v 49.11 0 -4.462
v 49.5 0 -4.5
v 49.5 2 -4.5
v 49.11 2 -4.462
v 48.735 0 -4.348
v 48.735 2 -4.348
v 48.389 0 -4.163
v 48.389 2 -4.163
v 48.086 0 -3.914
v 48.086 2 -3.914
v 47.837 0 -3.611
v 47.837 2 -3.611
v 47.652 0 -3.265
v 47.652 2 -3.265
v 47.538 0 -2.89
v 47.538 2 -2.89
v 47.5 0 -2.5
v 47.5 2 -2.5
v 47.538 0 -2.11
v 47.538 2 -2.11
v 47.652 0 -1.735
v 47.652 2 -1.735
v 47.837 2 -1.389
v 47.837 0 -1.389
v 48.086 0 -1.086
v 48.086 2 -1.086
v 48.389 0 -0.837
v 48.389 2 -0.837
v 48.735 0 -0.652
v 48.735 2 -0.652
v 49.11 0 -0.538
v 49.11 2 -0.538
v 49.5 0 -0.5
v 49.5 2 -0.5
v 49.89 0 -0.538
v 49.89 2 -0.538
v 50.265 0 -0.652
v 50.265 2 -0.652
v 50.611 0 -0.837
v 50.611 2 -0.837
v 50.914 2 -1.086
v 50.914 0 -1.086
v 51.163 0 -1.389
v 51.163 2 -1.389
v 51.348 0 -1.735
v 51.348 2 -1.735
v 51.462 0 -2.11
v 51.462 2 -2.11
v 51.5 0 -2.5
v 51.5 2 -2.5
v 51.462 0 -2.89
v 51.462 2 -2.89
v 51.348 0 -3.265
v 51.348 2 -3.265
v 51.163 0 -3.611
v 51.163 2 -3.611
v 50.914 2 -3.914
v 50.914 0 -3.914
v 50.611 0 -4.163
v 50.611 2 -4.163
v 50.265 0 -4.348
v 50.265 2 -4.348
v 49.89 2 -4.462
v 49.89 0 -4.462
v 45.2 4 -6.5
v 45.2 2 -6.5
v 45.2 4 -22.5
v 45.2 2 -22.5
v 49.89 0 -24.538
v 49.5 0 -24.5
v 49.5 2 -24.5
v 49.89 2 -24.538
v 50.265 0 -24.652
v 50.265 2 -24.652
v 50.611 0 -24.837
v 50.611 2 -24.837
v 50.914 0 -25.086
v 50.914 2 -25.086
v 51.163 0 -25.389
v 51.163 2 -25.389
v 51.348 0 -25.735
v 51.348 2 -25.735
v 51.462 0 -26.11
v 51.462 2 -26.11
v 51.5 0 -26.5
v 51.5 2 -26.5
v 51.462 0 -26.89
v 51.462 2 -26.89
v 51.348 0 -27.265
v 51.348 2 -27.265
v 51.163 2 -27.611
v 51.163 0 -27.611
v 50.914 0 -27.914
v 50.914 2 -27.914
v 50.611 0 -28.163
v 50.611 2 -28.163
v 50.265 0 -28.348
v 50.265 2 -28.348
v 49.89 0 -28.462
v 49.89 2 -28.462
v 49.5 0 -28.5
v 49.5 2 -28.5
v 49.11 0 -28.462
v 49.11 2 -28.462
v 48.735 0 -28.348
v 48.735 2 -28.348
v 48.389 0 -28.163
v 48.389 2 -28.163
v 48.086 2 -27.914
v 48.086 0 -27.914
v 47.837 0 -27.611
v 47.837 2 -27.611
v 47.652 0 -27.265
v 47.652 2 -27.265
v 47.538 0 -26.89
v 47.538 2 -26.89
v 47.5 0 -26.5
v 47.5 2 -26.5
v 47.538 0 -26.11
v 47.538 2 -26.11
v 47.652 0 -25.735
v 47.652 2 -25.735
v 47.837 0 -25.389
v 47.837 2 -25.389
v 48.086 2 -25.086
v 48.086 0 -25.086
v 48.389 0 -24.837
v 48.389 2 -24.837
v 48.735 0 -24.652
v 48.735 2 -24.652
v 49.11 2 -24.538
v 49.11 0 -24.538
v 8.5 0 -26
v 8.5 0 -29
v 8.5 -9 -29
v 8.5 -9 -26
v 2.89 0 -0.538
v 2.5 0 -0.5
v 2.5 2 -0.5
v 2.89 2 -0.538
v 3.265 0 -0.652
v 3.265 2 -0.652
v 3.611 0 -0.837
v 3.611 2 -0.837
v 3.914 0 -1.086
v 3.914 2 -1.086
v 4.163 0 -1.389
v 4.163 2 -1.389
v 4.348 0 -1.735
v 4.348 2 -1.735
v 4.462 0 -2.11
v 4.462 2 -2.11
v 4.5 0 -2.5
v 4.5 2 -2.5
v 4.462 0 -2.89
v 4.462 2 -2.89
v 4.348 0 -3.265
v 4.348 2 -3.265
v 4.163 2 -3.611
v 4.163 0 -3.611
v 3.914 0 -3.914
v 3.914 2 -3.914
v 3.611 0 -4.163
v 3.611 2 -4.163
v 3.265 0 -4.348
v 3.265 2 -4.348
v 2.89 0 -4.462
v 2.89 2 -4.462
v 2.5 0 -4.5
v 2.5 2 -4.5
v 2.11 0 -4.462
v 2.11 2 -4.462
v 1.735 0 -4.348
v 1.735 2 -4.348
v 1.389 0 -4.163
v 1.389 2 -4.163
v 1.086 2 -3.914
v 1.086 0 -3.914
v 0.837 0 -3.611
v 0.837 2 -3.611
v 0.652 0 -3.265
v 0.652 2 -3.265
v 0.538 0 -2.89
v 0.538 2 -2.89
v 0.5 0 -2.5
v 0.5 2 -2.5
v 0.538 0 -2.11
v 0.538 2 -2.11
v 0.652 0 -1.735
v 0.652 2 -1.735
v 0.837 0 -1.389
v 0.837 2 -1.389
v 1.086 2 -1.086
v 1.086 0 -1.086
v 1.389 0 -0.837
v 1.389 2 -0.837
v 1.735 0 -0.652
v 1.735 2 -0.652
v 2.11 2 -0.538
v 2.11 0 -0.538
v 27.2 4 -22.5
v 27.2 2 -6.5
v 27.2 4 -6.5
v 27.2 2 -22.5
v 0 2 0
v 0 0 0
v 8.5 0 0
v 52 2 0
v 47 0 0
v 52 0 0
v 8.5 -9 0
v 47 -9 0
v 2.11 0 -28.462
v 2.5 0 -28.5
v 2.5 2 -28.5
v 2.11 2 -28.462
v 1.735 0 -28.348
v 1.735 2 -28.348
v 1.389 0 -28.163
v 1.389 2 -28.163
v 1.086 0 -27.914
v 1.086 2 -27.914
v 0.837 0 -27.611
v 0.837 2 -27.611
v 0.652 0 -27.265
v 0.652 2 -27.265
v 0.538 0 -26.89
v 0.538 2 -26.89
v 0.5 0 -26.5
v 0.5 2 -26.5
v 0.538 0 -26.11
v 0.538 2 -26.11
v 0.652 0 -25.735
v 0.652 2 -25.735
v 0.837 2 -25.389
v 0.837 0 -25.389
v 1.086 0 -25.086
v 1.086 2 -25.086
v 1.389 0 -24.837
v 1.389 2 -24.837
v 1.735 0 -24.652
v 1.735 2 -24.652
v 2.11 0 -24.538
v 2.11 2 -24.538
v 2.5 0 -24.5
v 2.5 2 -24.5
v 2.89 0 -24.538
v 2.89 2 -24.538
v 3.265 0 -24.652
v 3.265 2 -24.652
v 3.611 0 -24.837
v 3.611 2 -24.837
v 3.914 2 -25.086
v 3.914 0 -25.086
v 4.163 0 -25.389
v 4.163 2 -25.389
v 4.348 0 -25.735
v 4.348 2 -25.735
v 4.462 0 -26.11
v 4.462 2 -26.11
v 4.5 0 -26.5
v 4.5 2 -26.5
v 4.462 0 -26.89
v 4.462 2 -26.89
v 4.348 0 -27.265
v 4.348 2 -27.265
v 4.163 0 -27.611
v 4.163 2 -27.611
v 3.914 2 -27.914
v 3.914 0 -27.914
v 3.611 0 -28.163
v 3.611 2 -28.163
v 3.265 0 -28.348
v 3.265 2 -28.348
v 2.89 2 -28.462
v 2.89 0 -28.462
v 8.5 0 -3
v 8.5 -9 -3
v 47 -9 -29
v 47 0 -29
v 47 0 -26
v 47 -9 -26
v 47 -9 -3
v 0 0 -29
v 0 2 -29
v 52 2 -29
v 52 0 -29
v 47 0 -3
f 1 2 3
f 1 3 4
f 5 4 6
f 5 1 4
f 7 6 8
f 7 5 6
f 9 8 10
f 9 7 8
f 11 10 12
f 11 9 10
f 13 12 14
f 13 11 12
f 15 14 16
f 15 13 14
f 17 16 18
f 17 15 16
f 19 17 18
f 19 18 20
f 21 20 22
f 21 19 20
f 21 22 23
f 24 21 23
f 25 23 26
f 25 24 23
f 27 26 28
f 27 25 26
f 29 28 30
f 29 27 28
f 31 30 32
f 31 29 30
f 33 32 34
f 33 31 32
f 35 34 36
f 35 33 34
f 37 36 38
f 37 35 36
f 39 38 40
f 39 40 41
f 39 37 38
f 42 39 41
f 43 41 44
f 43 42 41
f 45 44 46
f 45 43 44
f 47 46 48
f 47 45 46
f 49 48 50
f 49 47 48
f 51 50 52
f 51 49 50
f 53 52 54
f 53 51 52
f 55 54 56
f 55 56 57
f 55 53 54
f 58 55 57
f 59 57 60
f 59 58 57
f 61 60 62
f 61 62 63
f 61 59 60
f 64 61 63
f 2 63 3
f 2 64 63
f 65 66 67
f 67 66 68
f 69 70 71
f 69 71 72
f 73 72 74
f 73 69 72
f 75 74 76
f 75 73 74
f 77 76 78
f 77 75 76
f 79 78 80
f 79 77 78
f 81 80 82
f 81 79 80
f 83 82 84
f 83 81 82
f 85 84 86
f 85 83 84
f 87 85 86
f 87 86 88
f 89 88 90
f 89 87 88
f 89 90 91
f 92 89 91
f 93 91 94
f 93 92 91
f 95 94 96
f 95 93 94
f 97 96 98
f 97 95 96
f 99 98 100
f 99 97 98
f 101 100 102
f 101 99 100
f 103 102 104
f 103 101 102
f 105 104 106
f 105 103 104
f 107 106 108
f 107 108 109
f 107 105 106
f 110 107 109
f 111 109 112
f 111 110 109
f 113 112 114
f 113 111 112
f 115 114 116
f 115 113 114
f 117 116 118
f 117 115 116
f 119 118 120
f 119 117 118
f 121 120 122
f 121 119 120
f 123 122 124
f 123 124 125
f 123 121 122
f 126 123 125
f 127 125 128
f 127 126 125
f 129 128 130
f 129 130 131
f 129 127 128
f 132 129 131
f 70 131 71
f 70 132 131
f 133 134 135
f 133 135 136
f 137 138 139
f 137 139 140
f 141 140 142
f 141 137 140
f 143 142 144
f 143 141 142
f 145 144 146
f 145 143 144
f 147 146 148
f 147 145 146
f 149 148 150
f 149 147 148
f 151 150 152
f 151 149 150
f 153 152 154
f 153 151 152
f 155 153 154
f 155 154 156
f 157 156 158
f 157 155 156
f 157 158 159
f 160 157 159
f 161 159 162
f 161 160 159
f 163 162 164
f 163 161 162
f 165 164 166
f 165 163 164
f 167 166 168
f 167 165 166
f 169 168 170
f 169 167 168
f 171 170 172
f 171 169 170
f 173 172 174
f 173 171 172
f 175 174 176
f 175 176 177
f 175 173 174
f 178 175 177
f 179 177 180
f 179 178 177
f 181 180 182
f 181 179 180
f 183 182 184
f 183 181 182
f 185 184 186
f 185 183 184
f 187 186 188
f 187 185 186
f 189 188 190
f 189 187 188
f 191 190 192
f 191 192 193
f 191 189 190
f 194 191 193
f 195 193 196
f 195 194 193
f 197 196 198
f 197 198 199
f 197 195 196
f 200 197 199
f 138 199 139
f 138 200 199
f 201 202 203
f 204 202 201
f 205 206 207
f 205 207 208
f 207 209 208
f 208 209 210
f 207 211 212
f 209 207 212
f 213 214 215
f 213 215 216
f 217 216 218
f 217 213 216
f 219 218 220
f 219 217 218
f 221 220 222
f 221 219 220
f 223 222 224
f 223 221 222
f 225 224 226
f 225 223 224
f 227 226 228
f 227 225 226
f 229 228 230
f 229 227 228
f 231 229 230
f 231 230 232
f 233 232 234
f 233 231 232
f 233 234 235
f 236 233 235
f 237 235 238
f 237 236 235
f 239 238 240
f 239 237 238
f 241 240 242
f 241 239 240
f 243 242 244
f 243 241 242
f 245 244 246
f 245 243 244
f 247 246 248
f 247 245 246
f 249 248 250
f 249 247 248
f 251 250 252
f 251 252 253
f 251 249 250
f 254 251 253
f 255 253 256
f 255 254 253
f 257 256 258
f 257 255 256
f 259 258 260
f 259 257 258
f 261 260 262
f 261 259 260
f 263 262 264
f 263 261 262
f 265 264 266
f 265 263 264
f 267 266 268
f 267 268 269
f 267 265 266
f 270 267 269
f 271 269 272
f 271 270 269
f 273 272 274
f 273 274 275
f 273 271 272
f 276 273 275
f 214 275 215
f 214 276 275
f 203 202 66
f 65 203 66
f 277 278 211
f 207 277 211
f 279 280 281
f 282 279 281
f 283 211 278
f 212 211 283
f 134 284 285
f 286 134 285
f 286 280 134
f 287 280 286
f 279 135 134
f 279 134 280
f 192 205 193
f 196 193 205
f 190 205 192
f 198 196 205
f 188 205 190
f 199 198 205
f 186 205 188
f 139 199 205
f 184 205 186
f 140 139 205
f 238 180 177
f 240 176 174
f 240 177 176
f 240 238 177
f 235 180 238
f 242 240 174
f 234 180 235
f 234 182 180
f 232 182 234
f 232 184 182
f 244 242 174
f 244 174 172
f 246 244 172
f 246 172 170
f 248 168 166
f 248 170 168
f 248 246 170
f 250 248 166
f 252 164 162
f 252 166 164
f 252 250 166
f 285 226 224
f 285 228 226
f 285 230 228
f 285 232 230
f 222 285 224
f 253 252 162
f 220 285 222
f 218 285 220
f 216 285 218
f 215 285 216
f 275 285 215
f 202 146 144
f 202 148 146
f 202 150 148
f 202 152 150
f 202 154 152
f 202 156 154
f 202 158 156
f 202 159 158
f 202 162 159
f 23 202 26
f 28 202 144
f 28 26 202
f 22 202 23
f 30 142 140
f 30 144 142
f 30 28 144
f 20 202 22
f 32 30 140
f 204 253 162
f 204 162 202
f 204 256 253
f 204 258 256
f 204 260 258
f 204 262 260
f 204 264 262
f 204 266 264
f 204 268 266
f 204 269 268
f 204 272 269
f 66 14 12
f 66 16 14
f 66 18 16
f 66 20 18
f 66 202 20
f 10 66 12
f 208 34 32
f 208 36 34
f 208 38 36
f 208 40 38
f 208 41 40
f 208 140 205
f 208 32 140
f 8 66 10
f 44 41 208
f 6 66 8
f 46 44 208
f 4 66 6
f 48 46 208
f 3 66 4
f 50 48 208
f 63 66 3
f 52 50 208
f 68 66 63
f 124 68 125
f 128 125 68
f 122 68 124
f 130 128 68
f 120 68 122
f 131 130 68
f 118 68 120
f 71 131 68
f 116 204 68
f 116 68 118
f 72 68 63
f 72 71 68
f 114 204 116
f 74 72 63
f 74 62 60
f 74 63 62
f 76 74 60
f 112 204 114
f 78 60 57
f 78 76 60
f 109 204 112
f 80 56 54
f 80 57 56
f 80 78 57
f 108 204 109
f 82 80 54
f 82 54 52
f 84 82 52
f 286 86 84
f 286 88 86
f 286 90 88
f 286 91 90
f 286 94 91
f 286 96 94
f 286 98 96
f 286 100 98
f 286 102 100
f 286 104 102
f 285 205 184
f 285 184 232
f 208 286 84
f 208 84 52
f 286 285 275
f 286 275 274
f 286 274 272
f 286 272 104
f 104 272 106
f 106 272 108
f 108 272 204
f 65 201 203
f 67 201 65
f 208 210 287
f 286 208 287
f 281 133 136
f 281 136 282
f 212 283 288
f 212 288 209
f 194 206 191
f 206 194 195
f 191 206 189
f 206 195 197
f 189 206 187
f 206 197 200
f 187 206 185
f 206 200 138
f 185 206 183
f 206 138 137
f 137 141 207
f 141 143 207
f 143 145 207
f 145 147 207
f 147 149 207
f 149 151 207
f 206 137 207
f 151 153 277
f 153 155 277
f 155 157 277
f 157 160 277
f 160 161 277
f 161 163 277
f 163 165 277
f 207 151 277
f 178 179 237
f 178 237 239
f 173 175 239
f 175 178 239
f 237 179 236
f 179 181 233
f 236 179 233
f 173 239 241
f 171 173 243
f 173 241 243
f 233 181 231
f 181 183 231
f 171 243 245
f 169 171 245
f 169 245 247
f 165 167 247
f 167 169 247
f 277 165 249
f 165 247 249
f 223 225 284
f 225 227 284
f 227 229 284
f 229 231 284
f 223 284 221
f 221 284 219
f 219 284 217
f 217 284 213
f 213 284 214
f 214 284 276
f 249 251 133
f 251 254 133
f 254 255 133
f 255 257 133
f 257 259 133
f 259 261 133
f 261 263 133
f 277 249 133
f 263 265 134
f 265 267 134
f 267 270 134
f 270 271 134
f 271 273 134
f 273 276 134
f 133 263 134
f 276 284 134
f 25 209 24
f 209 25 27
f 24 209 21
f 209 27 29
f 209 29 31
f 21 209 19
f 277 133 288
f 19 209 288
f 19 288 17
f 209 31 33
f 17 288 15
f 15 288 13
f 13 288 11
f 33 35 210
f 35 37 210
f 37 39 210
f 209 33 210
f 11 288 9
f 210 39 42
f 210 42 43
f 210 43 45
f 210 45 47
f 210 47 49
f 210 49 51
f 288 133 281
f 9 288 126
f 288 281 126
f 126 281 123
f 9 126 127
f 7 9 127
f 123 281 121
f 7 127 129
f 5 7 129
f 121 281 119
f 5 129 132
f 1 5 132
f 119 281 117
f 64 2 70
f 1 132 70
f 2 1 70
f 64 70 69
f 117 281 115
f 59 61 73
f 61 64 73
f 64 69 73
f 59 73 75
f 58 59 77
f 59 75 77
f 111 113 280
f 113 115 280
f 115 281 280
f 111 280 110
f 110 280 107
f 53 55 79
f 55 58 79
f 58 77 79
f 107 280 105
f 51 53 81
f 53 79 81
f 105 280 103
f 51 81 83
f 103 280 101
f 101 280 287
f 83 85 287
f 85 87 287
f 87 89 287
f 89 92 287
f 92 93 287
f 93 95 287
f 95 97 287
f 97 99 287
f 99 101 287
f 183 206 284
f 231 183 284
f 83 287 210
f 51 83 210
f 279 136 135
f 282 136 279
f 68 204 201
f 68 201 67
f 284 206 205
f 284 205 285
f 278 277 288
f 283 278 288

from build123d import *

# Parameters (mm, degrees)
SKETCH_1_W      = 52
SKETCH_1_H      = 29
SKETCH_1_R      = 2
EXTRUDE_1_DEPTH = 2
SKETCH_2_W      = 18
SKETCH_2_H      = 16
EXTRUDE_2_DEPTH = 2
SKETCH_3_W      = 38.5
SKETCH_3_H      = 3
EXTRUDE_3_DEPTH = 9


with BuildPart() as part:
    # 草图1 → 凸台-拉伸1 (new body)
    with BuildSketch(Plane(origin=(0, 0, 0), x_dir=(1, 0, 0), z_dir=(0, 1, 0))):
        with Locations((26, 14.5)):
            Rectangle(SKETCH_1_W, SKETCH_1_H)
        with Locations(Location((49.5, 26.5, 0), (0, 0, 270))):
            Circle(SKETCH_1_R, mode=Mode.SUBTRACT)
        with Locations(Location((49.5, 2.5, 0), (0, 0, 90))):
            Circle(SKETCH_1_R, mode=Mode.SUBTRACT)
        with Locations(Location((2.5, 2.5, 0), (0, 0, 270))):
            Circle(SKETCH_1_R, mode=Mode.SUBTRACT)
        with Locations(Location((2.5, 26.5, 0), (0, 0, 90))):
            Circle(SKETCH_1_R, mode=Mode.SUBTRACT)
    extrude(amount=EXTRUDE_1_DEPTH)

    # 草图2 → 凸台-拉伸2 (add)
    with BuildSketch(Plane(origin=(0, 2, 0), x_dir=(1, 0, 0), z_dir=(0, 1, 0))):
        with Locations((36.2, 14.5)):
            Rectangle(SKETCH_2_W, SKETCH_2_H)
    extrude(amount=EXTRUDE_2_DEPTH)

    # 草图3 → 凸台-拉伸3 (add)
    with BuildSketch(Plane.XZ):
        with Locations((27.75, -1.5)):
            Rectangle(SKETCH_3_W, SKETCH_3_H)
        with Locations((27.75, -27.5)):
            Rectangle(SKETCH_3_W, SKETCH_3_H)
    extrude(amount=EXTRUDE_3_DEPTH)


solid = part.part
